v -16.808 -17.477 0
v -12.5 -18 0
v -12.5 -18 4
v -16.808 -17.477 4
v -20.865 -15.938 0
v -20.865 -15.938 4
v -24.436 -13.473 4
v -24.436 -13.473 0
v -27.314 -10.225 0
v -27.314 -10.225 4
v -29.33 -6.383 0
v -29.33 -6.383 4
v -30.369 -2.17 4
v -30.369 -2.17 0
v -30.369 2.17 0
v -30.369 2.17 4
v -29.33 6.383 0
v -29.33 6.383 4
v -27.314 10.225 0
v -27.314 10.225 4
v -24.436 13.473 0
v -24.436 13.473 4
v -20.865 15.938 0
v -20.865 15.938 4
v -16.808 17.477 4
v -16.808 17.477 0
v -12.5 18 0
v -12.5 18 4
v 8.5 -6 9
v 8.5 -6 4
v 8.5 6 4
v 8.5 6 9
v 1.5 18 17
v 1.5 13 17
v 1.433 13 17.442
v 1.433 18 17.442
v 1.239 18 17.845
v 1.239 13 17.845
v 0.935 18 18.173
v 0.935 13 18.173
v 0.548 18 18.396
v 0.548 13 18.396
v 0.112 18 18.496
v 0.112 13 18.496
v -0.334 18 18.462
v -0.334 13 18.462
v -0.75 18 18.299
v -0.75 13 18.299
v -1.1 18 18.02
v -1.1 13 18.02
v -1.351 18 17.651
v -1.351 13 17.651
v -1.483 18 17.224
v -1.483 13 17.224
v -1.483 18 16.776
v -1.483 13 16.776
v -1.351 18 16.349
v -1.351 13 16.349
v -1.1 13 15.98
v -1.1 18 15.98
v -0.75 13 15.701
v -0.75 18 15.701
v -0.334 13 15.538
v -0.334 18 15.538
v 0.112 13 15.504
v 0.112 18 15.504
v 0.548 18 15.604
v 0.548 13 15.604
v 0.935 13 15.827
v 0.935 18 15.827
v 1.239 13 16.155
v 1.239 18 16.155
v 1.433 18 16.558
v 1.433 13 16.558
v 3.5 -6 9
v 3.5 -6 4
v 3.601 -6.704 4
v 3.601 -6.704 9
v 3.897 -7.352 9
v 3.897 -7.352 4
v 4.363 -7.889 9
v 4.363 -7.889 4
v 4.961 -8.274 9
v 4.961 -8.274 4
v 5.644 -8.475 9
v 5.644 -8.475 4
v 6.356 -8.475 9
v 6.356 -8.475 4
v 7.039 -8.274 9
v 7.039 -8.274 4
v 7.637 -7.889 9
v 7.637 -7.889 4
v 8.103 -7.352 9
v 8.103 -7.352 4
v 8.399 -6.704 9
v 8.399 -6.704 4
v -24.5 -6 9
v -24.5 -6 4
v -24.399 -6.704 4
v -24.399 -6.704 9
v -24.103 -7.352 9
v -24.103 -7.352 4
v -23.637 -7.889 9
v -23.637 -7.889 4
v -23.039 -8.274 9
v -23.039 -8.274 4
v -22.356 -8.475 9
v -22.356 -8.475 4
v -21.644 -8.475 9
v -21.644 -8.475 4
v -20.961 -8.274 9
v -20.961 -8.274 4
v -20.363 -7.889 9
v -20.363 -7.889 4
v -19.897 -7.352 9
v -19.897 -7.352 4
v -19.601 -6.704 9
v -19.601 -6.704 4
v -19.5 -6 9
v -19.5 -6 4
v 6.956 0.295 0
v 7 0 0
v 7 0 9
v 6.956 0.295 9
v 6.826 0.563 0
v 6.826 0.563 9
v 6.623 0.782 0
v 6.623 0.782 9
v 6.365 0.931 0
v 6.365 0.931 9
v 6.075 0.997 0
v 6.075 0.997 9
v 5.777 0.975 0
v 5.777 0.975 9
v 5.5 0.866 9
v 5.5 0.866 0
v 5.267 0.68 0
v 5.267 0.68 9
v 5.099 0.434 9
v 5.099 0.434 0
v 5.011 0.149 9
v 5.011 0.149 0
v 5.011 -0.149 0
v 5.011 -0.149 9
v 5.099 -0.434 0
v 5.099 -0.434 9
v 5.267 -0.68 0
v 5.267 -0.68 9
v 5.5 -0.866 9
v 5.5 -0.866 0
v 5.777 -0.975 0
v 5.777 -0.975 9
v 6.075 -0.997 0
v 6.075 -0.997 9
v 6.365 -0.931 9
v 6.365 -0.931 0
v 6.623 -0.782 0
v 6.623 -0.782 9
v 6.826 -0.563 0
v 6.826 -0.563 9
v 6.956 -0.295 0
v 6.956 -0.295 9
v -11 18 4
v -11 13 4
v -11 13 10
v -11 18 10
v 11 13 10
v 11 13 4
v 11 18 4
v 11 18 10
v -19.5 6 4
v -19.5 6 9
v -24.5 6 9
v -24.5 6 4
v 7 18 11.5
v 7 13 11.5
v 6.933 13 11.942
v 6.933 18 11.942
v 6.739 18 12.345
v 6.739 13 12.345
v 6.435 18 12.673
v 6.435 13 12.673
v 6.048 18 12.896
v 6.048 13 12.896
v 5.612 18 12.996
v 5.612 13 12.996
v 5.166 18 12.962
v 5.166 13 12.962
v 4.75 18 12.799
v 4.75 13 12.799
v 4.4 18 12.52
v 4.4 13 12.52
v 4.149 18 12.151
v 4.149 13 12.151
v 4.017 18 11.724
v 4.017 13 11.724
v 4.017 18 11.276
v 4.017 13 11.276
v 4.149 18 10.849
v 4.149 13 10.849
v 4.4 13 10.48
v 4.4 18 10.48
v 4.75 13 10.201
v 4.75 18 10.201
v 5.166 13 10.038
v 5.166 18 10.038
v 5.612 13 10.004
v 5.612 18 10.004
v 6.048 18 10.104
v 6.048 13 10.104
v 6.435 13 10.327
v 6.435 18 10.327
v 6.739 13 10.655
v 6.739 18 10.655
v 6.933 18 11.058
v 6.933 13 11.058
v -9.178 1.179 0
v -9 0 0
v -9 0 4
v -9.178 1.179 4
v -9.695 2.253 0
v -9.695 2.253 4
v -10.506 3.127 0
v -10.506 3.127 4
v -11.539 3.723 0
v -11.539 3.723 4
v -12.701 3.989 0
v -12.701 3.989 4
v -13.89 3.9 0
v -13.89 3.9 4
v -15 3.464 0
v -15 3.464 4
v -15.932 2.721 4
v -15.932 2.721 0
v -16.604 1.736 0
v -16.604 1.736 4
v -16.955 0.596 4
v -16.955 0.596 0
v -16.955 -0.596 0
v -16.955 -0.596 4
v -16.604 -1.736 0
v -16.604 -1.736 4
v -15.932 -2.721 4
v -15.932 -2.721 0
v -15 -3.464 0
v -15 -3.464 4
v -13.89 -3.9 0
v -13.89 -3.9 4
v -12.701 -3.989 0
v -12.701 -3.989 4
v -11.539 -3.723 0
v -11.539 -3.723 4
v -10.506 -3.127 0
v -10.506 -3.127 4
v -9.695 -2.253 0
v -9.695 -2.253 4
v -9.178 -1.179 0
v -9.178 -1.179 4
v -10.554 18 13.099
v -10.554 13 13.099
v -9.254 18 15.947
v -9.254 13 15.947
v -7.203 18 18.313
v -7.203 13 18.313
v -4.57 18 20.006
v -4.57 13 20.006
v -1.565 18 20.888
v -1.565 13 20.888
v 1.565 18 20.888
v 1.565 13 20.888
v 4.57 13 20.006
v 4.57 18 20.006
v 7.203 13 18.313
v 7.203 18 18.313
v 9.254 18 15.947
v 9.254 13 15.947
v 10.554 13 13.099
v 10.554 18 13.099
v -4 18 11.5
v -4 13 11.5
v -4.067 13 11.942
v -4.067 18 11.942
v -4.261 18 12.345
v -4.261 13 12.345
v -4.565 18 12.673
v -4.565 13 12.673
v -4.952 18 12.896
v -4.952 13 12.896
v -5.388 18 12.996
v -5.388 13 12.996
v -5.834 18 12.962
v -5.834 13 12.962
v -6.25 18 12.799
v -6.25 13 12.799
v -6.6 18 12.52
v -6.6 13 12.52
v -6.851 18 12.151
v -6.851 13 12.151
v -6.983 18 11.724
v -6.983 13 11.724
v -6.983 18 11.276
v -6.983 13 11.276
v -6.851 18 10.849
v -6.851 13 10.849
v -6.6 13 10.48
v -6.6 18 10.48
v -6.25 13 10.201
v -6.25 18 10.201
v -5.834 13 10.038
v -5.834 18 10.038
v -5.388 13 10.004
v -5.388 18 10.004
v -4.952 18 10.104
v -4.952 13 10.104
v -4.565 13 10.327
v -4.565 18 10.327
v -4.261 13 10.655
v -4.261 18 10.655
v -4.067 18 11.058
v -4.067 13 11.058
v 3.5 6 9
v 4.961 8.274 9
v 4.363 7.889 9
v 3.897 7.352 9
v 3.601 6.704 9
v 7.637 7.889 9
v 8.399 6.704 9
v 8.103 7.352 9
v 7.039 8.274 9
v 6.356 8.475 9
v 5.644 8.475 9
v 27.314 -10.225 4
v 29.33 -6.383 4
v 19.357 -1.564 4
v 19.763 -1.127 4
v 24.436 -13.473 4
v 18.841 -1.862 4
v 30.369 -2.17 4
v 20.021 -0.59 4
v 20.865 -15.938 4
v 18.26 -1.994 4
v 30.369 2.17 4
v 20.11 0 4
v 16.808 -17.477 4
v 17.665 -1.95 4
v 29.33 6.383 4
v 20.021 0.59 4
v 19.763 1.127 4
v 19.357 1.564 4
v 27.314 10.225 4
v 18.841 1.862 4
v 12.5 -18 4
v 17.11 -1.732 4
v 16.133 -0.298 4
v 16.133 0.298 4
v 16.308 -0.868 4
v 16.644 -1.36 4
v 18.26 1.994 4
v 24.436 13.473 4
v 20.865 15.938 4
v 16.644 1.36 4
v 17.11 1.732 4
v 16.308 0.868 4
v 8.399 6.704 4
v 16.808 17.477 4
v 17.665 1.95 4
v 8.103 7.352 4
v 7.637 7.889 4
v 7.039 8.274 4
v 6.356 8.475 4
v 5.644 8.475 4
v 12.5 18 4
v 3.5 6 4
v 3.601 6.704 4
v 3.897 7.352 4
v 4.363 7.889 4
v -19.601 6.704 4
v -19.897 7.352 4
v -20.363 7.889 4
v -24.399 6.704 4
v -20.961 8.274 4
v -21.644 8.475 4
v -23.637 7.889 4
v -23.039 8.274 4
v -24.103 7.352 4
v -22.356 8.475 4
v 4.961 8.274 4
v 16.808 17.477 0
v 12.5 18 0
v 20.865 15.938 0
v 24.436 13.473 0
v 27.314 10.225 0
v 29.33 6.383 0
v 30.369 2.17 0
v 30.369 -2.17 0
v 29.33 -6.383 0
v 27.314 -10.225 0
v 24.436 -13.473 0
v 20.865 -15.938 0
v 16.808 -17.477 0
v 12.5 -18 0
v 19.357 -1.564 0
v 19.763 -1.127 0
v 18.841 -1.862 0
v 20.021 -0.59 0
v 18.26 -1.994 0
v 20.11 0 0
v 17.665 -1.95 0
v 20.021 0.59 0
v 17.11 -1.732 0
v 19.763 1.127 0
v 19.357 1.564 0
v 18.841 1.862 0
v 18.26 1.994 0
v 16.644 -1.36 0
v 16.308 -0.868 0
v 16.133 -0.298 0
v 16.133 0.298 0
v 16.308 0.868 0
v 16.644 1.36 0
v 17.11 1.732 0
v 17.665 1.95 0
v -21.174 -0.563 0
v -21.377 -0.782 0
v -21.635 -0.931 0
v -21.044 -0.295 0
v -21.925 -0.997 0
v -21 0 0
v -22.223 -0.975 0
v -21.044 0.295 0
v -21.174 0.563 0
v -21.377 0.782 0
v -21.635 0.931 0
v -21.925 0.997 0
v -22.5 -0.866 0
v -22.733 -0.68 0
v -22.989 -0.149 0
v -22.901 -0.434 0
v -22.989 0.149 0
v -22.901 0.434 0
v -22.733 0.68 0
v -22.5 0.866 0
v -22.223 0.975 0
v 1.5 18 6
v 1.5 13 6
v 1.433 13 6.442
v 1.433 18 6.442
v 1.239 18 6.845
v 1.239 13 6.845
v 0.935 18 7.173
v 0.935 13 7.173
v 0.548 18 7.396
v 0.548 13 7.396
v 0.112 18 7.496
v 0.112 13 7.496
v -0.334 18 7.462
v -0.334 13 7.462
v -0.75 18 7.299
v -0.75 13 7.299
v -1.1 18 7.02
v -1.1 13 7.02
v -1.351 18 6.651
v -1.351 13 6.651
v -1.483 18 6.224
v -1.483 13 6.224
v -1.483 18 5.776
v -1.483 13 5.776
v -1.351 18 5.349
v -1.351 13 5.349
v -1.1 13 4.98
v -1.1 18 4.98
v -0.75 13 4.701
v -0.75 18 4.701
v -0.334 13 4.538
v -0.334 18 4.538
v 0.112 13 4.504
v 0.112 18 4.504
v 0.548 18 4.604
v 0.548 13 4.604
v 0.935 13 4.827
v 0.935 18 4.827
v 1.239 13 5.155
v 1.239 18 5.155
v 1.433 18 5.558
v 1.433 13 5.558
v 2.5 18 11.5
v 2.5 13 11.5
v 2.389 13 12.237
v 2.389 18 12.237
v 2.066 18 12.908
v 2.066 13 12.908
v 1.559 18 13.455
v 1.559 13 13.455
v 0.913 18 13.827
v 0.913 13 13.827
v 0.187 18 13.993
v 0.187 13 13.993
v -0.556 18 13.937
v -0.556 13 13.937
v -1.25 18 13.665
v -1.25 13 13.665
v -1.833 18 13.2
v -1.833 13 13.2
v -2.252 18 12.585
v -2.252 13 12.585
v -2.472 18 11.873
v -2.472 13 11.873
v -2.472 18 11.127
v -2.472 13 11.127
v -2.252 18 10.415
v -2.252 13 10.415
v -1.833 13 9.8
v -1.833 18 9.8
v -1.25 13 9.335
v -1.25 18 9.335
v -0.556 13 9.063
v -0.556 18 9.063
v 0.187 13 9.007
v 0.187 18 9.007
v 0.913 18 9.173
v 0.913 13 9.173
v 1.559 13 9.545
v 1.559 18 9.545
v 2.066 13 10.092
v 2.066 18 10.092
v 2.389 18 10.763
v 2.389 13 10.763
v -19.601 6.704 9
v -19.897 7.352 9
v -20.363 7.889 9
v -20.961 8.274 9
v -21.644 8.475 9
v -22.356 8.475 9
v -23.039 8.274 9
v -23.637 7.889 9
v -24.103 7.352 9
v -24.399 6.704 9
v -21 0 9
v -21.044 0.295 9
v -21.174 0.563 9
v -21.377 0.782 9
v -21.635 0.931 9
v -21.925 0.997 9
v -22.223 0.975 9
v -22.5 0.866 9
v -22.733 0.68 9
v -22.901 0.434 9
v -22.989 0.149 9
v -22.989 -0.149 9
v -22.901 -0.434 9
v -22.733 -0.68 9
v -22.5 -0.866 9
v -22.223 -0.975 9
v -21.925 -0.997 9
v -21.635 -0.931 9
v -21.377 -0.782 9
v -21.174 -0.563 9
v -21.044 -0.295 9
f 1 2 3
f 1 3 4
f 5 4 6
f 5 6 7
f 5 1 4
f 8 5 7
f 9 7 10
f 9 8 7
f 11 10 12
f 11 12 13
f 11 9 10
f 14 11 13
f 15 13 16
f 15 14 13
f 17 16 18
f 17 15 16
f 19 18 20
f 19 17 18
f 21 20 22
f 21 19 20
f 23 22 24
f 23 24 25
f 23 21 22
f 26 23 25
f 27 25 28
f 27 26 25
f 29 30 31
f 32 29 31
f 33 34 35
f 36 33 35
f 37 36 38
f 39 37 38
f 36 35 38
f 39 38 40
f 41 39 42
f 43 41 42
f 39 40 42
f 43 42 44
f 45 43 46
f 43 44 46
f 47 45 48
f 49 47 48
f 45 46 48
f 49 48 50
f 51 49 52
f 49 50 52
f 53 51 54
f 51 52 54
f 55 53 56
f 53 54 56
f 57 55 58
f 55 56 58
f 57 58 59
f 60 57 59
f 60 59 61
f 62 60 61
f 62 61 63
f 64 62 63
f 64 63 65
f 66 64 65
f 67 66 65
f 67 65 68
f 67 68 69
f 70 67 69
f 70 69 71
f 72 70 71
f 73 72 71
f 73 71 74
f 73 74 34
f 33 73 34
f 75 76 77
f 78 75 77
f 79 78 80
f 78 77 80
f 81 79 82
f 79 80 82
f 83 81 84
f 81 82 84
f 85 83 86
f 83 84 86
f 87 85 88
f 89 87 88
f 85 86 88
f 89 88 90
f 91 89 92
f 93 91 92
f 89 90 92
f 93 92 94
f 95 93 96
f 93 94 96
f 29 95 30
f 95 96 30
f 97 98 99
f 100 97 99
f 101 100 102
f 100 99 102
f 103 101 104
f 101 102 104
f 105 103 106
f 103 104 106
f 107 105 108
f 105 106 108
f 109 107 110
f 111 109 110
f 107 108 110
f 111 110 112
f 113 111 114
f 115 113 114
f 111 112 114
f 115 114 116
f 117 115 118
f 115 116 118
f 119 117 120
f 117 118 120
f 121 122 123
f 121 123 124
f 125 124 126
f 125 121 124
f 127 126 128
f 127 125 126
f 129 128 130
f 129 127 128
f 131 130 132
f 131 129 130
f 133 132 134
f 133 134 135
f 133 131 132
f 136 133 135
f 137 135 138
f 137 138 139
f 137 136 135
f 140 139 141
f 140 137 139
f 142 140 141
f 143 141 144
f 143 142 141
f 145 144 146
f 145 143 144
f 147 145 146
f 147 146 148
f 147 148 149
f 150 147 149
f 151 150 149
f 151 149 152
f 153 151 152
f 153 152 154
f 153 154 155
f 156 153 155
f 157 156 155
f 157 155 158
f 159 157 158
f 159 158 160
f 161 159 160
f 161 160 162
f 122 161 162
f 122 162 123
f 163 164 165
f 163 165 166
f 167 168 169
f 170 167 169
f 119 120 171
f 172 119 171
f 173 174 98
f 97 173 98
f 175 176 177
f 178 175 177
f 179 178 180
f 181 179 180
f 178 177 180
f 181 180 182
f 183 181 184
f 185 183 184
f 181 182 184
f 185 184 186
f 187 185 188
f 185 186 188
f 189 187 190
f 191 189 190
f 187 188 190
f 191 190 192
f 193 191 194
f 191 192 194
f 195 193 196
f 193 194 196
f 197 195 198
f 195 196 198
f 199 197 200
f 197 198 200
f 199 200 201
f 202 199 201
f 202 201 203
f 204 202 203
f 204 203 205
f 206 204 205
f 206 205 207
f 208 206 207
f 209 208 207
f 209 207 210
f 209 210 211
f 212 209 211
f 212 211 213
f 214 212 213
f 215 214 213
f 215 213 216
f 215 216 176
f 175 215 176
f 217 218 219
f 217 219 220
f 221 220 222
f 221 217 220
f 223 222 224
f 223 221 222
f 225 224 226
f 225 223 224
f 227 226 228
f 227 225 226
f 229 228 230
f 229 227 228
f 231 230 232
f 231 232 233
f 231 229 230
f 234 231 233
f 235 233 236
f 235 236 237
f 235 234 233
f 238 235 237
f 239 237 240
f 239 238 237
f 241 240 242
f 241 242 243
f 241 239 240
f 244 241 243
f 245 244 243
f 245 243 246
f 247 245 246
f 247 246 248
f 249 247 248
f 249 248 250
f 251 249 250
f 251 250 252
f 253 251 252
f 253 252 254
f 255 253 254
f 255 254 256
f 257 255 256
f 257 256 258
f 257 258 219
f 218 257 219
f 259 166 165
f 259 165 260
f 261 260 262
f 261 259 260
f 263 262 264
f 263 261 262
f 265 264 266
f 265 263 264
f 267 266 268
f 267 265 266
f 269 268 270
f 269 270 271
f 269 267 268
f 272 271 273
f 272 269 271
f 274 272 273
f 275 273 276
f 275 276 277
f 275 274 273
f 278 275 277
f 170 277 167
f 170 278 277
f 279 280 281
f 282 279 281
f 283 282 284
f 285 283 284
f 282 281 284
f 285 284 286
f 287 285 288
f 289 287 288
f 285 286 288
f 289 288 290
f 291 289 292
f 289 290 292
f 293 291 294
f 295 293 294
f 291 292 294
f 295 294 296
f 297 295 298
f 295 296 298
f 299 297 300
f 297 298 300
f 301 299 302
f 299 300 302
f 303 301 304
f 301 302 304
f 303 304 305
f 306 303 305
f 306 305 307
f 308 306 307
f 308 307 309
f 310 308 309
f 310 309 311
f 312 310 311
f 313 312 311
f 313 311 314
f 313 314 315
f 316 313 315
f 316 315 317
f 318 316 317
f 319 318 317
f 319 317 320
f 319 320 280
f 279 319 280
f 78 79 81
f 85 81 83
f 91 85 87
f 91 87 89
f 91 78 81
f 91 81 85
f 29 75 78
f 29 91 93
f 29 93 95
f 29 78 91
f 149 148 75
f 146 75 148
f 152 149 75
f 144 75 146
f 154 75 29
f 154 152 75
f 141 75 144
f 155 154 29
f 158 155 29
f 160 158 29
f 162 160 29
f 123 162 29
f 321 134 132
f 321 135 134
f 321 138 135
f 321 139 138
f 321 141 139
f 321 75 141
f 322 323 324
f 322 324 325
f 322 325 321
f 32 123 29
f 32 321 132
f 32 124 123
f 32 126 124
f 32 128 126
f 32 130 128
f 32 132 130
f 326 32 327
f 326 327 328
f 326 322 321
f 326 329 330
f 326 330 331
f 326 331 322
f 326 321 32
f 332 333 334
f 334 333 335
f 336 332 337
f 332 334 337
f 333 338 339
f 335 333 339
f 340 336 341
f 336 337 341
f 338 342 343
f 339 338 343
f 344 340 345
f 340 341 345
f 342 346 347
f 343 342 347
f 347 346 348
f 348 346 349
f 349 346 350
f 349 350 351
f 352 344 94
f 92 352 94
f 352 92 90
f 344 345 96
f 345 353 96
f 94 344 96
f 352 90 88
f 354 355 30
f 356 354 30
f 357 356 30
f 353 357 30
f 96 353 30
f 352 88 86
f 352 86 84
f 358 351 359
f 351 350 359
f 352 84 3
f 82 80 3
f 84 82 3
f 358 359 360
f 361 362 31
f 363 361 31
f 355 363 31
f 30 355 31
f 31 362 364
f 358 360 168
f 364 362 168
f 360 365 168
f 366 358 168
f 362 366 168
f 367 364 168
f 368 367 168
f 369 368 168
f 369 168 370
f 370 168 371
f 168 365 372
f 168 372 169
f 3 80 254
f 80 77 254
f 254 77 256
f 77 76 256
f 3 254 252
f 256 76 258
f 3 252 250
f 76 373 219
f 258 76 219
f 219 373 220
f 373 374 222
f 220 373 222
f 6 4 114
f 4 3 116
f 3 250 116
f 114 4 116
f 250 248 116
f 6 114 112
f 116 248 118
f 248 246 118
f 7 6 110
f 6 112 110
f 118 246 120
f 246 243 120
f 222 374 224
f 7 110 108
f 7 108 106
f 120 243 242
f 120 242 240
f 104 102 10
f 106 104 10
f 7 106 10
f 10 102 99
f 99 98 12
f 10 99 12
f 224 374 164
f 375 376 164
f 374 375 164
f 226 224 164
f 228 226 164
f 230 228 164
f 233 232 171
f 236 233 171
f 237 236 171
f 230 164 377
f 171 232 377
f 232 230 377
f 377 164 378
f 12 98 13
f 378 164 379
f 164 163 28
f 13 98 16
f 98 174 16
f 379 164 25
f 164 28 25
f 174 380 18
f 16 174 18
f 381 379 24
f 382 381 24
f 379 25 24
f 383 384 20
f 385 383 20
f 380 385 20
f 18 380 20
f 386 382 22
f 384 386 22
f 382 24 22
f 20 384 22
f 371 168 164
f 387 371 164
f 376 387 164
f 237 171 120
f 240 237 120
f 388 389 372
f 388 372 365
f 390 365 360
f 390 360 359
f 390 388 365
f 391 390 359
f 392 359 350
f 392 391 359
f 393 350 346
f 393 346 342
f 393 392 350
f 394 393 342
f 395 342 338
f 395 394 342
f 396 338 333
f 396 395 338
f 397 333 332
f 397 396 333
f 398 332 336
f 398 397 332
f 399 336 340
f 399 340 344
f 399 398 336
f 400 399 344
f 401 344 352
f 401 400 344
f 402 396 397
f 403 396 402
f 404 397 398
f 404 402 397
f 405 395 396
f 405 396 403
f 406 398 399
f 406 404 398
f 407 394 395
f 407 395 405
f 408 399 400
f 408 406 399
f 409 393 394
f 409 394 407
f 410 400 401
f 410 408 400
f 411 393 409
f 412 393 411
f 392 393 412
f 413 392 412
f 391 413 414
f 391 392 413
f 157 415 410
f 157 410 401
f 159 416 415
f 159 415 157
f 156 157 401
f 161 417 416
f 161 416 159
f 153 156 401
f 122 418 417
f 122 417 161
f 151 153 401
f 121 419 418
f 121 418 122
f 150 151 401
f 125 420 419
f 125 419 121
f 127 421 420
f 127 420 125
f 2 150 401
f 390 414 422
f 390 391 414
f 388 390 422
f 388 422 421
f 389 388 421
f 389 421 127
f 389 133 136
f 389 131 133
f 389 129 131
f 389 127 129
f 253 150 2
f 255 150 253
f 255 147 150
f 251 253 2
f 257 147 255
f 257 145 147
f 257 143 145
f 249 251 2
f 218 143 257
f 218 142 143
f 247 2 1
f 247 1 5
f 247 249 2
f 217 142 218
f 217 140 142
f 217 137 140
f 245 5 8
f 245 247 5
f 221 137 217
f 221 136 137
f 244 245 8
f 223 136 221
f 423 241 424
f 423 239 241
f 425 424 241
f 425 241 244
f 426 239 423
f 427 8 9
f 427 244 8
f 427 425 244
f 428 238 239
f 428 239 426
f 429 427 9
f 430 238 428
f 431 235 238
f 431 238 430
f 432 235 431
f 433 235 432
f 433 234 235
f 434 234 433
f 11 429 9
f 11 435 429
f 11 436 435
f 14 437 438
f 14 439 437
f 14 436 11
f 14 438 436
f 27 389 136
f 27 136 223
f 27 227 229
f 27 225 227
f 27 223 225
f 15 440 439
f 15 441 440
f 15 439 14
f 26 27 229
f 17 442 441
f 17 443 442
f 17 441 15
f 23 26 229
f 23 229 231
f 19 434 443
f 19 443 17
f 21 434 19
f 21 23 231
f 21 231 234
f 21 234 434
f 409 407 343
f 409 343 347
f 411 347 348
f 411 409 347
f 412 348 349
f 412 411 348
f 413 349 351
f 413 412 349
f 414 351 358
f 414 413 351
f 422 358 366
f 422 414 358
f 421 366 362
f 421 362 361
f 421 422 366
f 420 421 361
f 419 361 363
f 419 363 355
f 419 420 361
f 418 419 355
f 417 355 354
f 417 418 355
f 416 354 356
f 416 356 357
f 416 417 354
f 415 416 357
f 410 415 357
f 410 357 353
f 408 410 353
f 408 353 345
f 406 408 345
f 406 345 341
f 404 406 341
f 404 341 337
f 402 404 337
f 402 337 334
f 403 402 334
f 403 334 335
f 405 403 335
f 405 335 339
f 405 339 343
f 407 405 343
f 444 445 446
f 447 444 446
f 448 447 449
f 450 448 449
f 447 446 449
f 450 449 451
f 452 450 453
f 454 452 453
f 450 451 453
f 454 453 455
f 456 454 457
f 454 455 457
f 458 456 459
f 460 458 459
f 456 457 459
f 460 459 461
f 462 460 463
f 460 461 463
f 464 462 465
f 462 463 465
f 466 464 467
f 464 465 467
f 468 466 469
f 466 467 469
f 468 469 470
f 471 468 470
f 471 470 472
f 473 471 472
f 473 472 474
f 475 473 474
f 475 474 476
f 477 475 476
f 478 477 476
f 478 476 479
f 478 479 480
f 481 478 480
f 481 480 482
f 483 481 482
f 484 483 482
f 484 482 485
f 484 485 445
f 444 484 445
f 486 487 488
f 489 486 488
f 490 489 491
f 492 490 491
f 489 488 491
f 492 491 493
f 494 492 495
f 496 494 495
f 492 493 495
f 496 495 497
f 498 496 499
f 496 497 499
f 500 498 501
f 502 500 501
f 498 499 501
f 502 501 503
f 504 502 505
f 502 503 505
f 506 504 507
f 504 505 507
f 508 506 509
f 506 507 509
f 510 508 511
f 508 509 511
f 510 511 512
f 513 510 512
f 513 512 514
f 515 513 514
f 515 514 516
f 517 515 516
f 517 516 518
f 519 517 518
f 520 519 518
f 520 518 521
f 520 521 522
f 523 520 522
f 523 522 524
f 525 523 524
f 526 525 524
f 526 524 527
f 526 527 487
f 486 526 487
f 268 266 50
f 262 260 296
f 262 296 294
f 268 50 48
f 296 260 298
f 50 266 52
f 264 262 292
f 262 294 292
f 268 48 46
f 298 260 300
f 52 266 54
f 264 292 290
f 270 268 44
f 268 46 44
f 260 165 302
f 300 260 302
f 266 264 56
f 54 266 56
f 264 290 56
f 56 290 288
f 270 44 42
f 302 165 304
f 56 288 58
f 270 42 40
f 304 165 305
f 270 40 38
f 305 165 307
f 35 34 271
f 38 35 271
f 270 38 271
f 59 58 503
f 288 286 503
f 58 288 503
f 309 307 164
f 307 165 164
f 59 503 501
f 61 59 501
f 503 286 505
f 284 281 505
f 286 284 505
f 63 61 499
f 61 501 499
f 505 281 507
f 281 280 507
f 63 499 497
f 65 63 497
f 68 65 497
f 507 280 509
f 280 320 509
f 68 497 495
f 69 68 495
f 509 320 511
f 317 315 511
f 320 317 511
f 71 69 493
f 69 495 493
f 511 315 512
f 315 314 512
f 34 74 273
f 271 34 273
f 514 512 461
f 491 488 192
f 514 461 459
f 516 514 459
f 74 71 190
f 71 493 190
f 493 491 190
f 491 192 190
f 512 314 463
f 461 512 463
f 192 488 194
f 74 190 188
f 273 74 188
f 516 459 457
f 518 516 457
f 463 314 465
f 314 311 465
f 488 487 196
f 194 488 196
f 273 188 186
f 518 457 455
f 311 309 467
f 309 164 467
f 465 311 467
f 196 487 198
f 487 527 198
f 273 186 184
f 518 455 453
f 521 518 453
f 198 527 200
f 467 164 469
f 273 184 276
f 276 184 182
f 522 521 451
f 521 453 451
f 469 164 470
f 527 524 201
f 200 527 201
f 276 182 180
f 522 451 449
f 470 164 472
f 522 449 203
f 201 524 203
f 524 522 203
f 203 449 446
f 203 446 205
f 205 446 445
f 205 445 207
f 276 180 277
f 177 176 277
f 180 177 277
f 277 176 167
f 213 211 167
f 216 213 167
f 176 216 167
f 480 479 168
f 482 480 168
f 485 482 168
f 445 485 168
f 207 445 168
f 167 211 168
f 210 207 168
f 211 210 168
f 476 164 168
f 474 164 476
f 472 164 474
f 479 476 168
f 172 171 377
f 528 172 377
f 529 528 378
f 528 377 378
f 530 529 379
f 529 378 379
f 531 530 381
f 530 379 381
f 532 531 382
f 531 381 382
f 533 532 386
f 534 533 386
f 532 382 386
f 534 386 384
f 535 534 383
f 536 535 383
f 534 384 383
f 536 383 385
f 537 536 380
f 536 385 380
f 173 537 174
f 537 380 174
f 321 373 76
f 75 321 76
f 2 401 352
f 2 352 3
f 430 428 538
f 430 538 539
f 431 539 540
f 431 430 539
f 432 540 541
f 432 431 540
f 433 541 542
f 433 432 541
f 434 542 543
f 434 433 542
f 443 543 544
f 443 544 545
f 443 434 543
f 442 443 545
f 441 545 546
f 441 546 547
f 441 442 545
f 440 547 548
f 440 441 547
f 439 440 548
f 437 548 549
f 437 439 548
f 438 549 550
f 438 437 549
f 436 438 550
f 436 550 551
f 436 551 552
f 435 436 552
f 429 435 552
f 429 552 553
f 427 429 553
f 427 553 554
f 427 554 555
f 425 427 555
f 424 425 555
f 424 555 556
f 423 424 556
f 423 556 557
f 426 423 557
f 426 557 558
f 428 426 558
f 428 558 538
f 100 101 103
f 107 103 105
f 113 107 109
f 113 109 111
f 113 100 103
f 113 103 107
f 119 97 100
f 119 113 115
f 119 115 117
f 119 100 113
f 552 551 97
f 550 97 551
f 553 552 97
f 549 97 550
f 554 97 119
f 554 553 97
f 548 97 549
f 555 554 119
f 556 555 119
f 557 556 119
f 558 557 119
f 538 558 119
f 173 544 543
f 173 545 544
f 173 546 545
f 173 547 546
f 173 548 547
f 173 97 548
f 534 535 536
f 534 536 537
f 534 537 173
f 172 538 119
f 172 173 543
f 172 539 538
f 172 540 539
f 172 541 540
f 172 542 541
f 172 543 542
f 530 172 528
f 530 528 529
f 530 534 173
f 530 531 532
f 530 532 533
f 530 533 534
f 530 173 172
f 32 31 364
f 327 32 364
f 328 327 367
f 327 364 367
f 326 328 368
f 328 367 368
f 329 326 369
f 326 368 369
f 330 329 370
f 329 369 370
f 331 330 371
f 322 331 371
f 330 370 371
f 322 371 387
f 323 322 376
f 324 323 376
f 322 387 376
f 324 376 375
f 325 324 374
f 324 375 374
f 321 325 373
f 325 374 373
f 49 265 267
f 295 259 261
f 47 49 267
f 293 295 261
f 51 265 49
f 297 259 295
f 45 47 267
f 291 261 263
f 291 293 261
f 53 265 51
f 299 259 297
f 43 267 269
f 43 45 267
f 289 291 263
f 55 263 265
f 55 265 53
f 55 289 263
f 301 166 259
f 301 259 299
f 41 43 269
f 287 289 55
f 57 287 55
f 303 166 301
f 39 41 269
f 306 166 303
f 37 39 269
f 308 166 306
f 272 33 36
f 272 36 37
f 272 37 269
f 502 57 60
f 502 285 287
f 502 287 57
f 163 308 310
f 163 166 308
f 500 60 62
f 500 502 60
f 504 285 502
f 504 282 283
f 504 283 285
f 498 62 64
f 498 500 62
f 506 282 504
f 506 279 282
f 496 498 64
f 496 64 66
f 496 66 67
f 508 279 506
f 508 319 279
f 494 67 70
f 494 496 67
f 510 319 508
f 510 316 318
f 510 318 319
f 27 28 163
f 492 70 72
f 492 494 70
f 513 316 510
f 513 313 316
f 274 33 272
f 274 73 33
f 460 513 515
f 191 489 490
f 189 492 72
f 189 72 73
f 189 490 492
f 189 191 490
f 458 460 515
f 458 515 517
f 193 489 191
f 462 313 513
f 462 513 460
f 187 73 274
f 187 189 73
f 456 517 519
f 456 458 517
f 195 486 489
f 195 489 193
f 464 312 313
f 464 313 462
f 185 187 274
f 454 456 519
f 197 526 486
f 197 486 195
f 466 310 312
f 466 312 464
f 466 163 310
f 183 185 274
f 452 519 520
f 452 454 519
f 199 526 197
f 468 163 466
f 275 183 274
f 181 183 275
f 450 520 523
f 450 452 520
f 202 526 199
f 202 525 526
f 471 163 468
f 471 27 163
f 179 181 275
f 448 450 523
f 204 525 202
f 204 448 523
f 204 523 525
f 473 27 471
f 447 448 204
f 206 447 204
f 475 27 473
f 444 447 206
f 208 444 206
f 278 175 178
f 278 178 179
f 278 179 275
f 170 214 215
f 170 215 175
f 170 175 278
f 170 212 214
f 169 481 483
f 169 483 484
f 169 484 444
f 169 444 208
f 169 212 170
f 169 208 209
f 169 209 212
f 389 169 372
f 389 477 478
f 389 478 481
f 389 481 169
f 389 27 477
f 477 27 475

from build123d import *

# Parameters (mm, degrees)
BOSS_EXTRUDE1_DEPTH = 4
SKETCH2_R           = 1
BOSS_EXTRUDE2_DEPTH = 5
CUT_EXTRUDE1_START  = -5
SKETCH2_3_R         = 4
SKETCH2_3_R_2       = 2
SKETCH2_3_R_3       = 1
CUT_EXTRUDE1_DEPTH  = 5
SKETCH3_W           = 22
SKETCH3_H           = 5
BOSS_EXTRUDE3_DEPTH = 17
FILLET1_RADIUS      = 11
FILLET1_LENGTH      = 5
SKETCH5_R           = 2.5
SKETCH5_R_2         = 1.5
CUT_EXTRUDE3_DEPTH  = 17


with BuildPart() as part:
    # Sketch1 → Boss-Extrude1 (new body)
    with BuildSketch(Plane.XY):
        with BuildLine():
            Line((-12.5, 18), (12.5, 18))
            ThreePointArc((12.5, 18), (30.5, 0), (12.5, -18))
            Line((12.5, -18), (-12.5, -18))
            ThreePointArc((-12.5, -18), (-30.5, 0), (-12.5, 18))
        make_face()
    extrude(amount=BOSS_EXTRUDE1_DEPTH)

    # Sketch2 → Boss-Extrude2 (add)
    # profile 1 of 2: a face of its own
    with BuildSketch(Plane.XY.offset(4)):
        with BuildLine():
            Line((-24.5, 6), (-24.5, -6))
            ThreePointArc((-24.5, -6), (-22, -8.5), (-19.5, -6))
            Line((-19.5, -6), (-19.5, 6))
            ThreePointArc((-19.5, 6), (-22, 8.5), (-24.5, 6))
        make_face()
        with Locations((-22, 0)):
            Circle(SKETCH2_R, mode=Mode.SUBTRACT)
    # profile 2 of 2: a face of its own
    with BuildSketch(Plane.XY.offset(4)):
        with BuildLine():
            Line((3.5, 6), (3.5, -6))
            ThreePointArc((3.5, -6), (6, -8.5), (8.5, -6))
            Line((8.5, -6), (8.5, 6))
            ThreePointArc((8.5, 6), (6, 8.5), (3.5, 6))
        make_face()
        with Locations((6, 0)):
            Circle(SKETCH2_R, mode=Mode.SUBTRACT)
    extrude(amount=BOSS_EXTRUDE2_DEPTH)

    # Sketch2<3> → Cut-Extrude1 (cut)
    with BuildSketch(Plane.XY.offset(4).offset(CUT_EXTRUDE1_START)):
        with Locations((-13, 0)):
            Circle(SKETCH2_3_R)
        with Locations((18.110196417, 0)):
            Circle(SKETCH2_3_R_2)
        with Locations((-22, 0)):
            Circle(SKETCH2_3_R_3)
        with Locations((6, 0)):
            Circle(SKETCH2_3_R_3)
    extrude(amount=CUT_EXTRUDE1_DEPTH, mode=Mode.SUBTRACT)

    # Sketch3 → Boss-Extrude3 (add)
    with BuildSketch(Plane.XY.offset(4)):
        with Locations((0, 15.5)):
            Rectangle(SKETCH3_W, SKETCH3_H)
    extrude(amount=BOSS_EXTRUDE3_DEPTH)

    # Fillet1: full round fillet: the end face becomes a half cylinder, R = half its width
    fillet1_face = Plane((0, 15.5, 21), x_dir=(0, 1, 0), z_dir=(0, 0, 1))  # on the end face: x along it, z out of the body
    fillet1_slab = fillet1_face.offset(-FILLET1_RADIUS / 2) * Box(FILLET1_LENGTH, 2 * FILLET1_RADIUS, FILLET1_RADIUS, mode=Mode.PRIVATE)  # the body's end, R deep
    fillet1_round = Plane((0, 15.5, 10), x_dir=(0, 0, 1), z_dir=(0, 1, 0)) * Cylinder(FILLET1_RADIUS, FILLET1_LENGTH, mode=Mode.PRIVATE)  # its axis R under the face
    add(fillet1_slab - fillet1_round, mode=Mode.SUBTRACT)

    # Sketch5 → Cut-Extrude3 (cut)
    with BuildSketch(Plane.XZ.offset(-13)):
        with Locations((0, 11.5)):
            Circle(SKETCH5_R)
        with Locations((5.5, 11.5)):
            Circle(SKETCH5_R_2)
        with Locations((0, 17)):
            Circle(SKETCH5_R_2)
        with Locations((-5.5, 11.5)):
            Circle(SKETCH5_R_2)
        with Locations((0, 6)):
            Circle(SKETCH5_R_2)
    extrude(amount=-CUT_EXTRUDE3_DEPTH, mode=Mode.SUBTRACT)


solid = part.part
